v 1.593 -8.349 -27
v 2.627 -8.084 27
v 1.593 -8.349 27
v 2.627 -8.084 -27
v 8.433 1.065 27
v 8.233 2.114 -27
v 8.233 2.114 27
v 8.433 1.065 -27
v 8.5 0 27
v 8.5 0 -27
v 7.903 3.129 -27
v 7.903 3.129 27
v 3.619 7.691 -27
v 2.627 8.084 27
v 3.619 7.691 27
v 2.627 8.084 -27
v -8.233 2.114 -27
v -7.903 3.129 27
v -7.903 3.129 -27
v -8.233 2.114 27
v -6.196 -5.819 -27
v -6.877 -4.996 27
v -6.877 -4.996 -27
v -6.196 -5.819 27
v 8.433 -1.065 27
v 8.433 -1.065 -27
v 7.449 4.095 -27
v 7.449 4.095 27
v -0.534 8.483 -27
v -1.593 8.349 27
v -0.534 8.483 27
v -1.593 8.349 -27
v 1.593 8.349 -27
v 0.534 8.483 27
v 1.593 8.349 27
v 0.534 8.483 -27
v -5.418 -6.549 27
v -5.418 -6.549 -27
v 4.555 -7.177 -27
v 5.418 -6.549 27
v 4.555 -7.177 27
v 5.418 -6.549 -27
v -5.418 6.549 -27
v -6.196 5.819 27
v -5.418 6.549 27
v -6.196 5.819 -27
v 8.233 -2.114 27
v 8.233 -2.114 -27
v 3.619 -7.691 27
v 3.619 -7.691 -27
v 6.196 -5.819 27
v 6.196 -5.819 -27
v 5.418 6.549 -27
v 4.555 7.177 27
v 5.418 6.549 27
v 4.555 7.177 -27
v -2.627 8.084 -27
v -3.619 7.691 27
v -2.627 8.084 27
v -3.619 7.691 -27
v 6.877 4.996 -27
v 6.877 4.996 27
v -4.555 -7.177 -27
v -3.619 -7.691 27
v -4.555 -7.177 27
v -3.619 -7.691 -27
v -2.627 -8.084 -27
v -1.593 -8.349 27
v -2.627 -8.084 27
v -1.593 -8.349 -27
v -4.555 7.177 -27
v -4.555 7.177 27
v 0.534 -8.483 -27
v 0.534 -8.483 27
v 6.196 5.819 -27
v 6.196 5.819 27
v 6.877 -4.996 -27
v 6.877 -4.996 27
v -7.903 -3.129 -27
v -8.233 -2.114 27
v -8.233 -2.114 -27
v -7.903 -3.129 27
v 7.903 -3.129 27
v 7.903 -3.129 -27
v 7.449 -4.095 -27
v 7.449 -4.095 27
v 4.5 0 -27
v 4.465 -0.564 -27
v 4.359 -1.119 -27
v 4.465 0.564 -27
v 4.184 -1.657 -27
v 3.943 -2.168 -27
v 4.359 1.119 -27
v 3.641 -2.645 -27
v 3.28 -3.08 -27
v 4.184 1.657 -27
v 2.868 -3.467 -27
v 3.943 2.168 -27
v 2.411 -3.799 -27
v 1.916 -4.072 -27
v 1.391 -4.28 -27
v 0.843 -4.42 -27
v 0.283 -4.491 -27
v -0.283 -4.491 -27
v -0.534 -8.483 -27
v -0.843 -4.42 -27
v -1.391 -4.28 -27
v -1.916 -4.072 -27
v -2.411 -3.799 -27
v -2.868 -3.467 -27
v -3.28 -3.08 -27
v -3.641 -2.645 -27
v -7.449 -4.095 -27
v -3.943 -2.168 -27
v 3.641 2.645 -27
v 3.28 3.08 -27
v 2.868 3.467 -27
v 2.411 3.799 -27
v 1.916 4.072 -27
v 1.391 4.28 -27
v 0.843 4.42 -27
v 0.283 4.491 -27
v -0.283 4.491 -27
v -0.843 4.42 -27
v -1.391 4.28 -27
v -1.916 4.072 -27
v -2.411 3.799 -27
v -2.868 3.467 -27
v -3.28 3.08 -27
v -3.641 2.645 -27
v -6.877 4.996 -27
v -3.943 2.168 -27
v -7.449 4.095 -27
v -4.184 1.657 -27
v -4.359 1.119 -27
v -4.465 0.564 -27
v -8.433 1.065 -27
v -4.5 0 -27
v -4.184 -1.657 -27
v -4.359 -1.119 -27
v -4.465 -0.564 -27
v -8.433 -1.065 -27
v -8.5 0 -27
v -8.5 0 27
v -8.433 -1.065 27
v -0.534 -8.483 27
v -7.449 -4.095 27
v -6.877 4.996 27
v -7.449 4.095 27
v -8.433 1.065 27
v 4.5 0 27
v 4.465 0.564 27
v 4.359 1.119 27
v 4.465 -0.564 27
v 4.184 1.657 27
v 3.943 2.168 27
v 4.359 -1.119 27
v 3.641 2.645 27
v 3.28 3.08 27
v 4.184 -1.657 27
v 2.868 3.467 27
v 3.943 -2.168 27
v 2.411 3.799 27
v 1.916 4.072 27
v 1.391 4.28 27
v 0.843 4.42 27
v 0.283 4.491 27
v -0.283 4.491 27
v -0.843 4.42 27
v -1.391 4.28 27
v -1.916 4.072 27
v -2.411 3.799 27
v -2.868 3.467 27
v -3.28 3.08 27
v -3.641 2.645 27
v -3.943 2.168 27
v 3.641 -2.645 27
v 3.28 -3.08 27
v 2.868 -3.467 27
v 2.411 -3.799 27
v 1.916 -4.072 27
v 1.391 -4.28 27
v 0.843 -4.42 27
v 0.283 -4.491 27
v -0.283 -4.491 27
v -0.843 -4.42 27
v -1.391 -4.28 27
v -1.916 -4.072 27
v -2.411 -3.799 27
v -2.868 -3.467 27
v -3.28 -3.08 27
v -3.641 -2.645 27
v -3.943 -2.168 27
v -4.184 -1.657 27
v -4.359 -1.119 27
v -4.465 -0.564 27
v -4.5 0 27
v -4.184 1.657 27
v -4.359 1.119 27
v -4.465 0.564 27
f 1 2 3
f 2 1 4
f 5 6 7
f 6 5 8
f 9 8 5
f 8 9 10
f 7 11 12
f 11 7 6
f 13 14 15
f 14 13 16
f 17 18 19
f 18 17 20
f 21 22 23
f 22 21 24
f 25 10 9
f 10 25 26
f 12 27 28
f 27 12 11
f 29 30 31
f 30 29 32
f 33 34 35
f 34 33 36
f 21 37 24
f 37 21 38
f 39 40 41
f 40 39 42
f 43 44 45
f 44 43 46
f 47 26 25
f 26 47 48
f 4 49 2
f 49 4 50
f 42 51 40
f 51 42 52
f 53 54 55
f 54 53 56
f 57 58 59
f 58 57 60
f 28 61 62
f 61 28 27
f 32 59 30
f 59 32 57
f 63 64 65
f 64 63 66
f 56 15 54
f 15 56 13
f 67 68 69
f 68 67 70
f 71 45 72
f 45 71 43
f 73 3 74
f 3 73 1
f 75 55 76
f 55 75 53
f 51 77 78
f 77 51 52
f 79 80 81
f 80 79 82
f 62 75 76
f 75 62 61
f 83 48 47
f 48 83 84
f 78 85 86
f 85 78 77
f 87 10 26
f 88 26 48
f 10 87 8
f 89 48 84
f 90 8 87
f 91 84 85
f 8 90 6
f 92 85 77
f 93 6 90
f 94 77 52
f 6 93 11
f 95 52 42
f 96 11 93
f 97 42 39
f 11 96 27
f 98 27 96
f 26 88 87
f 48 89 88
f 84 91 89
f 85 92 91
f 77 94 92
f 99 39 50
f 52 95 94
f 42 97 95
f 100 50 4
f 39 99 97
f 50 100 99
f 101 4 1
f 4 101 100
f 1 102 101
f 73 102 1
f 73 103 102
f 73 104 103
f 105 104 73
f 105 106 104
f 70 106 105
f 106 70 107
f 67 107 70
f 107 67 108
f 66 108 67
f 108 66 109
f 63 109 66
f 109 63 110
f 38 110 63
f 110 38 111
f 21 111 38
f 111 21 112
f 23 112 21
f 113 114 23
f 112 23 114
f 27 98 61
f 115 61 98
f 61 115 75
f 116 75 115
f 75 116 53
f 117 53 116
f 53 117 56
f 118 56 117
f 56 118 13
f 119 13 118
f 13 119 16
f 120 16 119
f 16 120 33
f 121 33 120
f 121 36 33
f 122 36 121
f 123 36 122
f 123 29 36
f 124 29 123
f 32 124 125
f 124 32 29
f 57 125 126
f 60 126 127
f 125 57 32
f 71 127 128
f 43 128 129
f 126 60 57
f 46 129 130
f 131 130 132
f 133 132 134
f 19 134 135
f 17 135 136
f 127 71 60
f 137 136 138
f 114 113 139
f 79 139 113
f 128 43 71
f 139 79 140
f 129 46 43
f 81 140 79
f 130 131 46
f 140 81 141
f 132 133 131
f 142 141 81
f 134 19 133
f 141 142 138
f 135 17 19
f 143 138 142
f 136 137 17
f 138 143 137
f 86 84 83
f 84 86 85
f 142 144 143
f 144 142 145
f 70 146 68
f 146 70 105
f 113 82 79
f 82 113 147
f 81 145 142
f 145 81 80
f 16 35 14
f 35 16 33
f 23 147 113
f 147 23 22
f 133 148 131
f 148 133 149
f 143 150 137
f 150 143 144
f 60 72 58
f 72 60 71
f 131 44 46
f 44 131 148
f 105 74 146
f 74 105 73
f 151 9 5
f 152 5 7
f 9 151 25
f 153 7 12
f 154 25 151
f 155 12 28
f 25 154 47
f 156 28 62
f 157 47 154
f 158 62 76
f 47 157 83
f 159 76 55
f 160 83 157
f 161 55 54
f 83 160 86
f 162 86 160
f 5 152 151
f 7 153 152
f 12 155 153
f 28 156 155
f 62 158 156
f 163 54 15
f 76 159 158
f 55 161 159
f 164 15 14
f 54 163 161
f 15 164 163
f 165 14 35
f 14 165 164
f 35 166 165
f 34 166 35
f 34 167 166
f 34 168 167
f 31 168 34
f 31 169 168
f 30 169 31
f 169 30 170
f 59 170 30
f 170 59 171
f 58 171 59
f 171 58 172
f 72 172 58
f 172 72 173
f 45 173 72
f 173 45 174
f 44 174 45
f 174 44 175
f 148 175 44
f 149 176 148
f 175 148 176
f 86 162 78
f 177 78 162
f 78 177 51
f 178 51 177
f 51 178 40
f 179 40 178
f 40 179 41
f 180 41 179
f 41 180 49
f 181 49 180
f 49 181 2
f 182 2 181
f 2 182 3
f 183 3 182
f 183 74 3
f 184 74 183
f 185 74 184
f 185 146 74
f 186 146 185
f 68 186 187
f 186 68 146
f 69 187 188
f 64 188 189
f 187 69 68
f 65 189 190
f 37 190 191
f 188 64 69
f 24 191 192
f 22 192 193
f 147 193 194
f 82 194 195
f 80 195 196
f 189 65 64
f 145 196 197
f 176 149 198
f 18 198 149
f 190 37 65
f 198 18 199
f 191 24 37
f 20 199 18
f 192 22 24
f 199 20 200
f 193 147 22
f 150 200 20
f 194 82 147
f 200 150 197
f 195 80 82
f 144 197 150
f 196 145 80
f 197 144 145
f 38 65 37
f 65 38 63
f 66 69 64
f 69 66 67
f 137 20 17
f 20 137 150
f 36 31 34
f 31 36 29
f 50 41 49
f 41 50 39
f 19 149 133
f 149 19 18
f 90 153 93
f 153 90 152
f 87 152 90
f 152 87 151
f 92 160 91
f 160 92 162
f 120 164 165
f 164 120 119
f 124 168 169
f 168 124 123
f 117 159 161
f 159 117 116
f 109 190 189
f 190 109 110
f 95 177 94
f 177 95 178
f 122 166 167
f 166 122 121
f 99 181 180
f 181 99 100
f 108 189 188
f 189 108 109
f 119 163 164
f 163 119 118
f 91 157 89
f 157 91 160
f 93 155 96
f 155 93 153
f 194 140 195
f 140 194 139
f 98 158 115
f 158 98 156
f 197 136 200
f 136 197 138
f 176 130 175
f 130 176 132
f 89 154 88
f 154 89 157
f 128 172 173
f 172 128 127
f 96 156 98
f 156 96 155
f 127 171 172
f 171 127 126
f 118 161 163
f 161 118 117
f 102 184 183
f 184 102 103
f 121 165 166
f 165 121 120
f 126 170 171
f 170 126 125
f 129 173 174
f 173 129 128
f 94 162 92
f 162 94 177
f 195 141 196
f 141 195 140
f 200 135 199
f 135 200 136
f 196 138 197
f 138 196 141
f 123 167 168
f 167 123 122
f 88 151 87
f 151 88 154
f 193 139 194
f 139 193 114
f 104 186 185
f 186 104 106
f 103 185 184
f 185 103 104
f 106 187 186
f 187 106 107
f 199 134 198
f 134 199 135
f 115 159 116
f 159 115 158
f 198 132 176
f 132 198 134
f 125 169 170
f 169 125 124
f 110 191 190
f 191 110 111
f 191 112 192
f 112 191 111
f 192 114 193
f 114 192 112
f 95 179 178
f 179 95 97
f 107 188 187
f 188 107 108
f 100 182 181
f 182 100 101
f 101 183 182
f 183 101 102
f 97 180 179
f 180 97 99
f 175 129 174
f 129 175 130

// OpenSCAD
$fn = 50;


difference() {
	union() {
		translate(v = [0, 0, -27.0000000000]) {
			cylinder(h = 54, r = 8.5000000000);
		}
	}
	union() {
		translate(v = [0, 0, -100.0000000000]) {
			cylinder(h = 200, r = 4.5000000000);
		}
	}
}
